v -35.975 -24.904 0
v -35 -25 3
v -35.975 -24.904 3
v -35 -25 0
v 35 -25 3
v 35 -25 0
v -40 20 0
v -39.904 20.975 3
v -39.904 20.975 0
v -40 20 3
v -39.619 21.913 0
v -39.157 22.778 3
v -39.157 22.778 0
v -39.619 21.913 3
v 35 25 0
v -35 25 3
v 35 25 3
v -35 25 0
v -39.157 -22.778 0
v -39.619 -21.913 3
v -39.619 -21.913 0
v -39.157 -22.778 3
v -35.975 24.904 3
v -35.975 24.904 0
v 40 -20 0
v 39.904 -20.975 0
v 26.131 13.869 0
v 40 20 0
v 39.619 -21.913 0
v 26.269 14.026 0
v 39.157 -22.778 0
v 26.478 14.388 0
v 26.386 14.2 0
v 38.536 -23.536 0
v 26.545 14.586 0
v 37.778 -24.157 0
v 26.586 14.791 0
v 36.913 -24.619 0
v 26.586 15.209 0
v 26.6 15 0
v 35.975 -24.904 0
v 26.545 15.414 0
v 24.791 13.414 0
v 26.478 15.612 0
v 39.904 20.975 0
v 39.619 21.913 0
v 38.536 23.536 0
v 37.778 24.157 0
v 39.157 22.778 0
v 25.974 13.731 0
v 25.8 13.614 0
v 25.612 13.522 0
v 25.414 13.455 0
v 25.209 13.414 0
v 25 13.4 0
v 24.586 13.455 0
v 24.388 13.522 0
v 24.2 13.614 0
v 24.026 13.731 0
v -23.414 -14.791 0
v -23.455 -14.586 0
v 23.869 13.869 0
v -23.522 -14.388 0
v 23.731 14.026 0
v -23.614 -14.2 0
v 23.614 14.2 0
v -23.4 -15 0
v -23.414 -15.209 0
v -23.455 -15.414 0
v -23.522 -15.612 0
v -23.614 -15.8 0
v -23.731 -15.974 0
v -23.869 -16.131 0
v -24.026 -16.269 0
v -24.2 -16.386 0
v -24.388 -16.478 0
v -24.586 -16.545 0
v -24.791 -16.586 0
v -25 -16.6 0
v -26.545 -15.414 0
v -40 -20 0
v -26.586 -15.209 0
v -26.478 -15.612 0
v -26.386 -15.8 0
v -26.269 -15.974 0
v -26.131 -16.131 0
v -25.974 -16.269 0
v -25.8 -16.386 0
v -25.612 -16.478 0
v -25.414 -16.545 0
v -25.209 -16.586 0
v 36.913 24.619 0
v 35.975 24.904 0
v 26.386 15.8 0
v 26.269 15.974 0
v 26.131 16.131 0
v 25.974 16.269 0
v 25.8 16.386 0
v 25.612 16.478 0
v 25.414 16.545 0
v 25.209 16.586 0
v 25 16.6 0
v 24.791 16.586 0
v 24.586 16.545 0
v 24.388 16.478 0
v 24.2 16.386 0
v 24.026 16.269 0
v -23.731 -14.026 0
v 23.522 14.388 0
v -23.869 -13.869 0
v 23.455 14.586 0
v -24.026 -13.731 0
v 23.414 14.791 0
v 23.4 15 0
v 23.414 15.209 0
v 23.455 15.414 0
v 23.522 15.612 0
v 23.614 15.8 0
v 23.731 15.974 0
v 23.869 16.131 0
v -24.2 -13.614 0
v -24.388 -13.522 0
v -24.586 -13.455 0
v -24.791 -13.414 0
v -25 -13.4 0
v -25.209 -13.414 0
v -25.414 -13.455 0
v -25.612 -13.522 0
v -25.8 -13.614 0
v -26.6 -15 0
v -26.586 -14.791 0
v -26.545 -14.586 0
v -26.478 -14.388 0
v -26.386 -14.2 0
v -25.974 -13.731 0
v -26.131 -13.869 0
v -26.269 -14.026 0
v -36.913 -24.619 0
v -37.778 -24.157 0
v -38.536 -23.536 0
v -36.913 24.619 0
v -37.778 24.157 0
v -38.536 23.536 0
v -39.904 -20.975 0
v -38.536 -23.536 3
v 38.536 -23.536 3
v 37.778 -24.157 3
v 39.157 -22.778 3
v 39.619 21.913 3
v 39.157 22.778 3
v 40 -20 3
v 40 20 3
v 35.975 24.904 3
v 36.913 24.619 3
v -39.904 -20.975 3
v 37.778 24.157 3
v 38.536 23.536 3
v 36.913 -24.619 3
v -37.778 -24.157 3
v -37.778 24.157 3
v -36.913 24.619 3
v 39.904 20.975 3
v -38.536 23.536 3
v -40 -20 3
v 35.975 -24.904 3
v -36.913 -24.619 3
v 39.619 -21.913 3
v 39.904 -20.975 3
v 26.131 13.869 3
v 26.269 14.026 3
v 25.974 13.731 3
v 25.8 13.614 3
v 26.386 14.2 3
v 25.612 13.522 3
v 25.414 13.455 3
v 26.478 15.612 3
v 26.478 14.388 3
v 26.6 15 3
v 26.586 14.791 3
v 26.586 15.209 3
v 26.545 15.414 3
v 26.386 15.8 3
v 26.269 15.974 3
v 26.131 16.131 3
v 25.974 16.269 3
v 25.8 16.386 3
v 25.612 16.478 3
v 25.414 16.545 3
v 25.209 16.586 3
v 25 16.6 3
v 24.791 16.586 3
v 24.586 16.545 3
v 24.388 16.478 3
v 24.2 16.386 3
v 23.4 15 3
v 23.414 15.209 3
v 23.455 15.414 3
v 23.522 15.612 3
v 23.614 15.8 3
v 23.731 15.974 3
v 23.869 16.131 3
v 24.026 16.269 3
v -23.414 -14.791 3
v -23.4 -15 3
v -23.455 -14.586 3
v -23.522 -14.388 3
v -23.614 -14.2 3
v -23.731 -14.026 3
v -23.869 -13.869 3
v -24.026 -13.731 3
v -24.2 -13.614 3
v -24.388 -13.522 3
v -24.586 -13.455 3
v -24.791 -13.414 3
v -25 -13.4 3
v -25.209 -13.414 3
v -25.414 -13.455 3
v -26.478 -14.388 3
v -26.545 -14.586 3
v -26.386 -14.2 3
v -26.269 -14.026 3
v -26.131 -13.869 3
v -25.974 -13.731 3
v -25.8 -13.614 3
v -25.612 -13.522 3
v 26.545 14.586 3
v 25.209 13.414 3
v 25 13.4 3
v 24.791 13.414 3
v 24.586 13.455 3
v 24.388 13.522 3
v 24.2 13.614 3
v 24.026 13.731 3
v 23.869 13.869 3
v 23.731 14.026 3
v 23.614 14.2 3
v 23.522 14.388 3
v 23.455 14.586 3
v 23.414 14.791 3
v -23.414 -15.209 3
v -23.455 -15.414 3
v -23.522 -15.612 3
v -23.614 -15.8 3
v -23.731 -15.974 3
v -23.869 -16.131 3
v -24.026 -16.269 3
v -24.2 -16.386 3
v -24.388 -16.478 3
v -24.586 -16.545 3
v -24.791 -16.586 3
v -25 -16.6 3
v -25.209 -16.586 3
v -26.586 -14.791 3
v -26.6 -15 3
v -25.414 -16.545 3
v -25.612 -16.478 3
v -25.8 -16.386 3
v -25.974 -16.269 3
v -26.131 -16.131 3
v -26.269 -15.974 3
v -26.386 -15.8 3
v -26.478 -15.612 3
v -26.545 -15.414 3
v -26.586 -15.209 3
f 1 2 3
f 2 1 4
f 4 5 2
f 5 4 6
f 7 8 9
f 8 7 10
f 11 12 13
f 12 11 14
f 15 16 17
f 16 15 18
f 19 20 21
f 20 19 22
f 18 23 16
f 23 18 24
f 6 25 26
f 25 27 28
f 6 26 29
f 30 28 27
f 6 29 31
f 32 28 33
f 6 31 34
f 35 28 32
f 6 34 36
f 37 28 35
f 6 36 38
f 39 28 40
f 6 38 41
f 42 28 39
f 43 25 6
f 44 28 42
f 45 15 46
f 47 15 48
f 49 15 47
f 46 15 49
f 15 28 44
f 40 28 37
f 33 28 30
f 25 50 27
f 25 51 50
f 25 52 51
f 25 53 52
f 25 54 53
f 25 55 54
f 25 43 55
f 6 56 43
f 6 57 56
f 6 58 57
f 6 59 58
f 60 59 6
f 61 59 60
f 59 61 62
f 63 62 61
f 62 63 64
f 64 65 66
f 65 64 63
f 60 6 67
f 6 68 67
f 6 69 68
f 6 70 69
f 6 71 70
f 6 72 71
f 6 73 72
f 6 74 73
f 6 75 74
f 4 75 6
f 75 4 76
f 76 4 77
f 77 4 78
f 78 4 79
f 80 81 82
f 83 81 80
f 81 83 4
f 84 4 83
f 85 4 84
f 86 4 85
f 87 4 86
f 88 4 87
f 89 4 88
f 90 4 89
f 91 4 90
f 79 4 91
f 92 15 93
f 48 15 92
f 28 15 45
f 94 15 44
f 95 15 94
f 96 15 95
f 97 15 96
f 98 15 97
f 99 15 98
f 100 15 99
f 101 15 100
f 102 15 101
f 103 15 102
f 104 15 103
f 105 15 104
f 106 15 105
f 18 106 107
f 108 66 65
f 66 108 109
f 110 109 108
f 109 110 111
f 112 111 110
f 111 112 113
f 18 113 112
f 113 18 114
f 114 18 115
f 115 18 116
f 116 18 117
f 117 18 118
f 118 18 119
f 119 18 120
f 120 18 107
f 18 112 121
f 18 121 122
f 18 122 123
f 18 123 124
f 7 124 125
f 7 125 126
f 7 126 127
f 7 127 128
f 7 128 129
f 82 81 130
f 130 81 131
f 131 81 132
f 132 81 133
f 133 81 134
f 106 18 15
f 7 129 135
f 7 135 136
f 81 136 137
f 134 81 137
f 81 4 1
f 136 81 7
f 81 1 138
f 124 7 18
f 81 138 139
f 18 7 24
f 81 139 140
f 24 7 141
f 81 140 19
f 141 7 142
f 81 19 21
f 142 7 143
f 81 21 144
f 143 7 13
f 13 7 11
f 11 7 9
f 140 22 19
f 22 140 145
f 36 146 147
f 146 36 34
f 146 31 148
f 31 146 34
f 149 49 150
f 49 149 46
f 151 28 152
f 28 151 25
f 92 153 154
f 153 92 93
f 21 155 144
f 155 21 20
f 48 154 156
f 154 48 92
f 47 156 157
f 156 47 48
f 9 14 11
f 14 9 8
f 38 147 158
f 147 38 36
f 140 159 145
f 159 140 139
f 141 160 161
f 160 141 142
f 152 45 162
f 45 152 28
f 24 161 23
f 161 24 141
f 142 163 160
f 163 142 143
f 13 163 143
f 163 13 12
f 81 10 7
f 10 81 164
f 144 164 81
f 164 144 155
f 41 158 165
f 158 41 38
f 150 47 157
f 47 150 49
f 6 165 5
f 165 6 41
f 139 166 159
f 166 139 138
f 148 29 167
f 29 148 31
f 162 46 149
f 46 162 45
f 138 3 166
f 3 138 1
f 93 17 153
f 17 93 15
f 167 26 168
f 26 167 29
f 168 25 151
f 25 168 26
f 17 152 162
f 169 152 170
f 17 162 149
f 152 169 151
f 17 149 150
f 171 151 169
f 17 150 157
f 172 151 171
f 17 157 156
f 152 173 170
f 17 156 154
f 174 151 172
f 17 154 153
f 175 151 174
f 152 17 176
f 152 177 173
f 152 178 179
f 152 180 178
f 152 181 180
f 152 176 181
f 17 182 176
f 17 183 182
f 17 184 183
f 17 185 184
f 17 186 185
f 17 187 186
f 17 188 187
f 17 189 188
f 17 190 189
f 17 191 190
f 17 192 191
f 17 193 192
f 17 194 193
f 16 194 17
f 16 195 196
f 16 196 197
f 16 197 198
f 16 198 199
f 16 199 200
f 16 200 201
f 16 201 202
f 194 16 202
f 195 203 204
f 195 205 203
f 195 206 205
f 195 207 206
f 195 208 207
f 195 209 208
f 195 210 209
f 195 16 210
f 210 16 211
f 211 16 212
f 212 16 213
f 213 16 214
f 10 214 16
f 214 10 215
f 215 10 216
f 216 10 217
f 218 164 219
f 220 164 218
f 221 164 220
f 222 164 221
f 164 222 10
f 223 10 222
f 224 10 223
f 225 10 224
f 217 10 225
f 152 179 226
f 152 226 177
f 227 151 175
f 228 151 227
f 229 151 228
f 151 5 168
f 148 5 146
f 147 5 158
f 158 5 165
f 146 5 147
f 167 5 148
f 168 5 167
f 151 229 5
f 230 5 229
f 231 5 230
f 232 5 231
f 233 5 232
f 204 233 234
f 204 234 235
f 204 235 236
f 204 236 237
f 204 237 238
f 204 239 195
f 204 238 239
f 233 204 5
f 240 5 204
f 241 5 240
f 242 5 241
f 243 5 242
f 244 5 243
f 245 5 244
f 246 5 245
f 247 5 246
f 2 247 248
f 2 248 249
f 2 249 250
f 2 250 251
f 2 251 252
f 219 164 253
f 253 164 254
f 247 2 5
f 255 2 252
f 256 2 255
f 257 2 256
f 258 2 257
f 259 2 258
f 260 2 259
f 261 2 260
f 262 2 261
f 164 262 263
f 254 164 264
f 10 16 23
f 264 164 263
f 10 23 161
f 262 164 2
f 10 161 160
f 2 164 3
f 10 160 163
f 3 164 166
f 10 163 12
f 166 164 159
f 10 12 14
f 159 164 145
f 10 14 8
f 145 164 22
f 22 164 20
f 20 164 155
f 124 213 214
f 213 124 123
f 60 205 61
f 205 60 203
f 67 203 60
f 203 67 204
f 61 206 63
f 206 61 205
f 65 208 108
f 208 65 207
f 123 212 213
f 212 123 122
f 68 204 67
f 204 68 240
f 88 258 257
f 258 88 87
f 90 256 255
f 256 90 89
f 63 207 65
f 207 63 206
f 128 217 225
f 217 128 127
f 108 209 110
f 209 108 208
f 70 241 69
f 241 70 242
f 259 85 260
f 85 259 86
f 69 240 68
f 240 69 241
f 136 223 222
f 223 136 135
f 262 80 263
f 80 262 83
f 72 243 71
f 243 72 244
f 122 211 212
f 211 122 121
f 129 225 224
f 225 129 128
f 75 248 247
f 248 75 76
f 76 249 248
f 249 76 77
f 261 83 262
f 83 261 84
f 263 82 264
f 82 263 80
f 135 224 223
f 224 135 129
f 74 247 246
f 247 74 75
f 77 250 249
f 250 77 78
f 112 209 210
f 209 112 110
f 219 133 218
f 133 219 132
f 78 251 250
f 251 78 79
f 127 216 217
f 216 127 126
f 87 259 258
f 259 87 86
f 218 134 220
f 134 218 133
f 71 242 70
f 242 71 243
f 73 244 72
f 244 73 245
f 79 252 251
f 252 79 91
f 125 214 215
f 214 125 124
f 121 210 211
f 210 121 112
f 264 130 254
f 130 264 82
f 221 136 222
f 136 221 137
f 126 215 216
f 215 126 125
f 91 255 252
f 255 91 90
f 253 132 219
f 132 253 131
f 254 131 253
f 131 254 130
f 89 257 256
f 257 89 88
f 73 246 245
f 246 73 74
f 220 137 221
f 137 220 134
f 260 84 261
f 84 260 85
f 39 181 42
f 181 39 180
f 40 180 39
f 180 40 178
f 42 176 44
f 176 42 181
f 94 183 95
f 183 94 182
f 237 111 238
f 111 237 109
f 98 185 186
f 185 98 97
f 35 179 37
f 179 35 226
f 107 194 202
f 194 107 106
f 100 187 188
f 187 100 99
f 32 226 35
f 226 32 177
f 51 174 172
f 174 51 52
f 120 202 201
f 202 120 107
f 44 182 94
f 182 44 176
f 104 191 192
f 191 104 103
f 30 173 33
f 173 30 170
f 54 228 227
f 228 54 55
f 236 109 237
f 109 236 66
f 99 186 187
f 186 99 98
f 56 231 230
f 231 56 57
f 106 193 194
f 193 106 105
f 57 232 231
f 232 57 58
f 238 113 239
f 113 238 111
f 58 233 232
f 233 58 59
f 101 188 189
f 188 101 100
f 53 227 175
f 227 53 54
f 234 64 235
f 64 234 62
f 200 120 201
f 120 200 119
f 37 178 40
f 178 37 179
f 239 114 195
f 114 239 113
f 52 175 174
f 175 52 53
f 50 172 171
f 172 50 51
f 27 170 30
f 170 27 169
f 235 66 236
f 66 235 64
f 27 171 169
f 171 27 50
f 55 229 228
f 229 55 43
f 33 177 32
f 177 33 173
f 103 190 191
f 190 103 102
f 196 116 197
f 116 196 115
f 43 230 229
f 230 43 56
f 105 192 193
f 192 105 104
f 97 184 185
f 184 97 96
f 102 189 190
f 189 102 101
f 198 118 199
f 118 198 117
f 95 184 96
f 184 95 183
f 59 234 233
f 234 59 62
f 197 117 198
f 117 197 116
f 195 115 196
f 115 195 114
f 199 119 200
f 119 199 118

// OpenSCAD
// Generated by printspec 0.1.0
// Review generated CAD before manufacturing.

length = 80;
width = 50;
height = 3;
corner_radius = 5;

module rounded_plate() {
  hull() {
    for (x = [-length/2 + corner_radius, length/2 - corner_radius])
      for (y = [-width/2 + corner_radius, width/2 - corner_radius])
        translate([x, y, 0]) cylinder(h = height, r = corner_radius, $fn = 32);
  }
}

difference() {
  rounded_plate();
  translate([-25, -15, -0.1]) cylinder(h = height + 0.2, d = 3.2, $fn = 48);
  translate([25, 15, -0.1]) cylinder(h = height + 0.2, d = 3.2, $fn = 48);
}
